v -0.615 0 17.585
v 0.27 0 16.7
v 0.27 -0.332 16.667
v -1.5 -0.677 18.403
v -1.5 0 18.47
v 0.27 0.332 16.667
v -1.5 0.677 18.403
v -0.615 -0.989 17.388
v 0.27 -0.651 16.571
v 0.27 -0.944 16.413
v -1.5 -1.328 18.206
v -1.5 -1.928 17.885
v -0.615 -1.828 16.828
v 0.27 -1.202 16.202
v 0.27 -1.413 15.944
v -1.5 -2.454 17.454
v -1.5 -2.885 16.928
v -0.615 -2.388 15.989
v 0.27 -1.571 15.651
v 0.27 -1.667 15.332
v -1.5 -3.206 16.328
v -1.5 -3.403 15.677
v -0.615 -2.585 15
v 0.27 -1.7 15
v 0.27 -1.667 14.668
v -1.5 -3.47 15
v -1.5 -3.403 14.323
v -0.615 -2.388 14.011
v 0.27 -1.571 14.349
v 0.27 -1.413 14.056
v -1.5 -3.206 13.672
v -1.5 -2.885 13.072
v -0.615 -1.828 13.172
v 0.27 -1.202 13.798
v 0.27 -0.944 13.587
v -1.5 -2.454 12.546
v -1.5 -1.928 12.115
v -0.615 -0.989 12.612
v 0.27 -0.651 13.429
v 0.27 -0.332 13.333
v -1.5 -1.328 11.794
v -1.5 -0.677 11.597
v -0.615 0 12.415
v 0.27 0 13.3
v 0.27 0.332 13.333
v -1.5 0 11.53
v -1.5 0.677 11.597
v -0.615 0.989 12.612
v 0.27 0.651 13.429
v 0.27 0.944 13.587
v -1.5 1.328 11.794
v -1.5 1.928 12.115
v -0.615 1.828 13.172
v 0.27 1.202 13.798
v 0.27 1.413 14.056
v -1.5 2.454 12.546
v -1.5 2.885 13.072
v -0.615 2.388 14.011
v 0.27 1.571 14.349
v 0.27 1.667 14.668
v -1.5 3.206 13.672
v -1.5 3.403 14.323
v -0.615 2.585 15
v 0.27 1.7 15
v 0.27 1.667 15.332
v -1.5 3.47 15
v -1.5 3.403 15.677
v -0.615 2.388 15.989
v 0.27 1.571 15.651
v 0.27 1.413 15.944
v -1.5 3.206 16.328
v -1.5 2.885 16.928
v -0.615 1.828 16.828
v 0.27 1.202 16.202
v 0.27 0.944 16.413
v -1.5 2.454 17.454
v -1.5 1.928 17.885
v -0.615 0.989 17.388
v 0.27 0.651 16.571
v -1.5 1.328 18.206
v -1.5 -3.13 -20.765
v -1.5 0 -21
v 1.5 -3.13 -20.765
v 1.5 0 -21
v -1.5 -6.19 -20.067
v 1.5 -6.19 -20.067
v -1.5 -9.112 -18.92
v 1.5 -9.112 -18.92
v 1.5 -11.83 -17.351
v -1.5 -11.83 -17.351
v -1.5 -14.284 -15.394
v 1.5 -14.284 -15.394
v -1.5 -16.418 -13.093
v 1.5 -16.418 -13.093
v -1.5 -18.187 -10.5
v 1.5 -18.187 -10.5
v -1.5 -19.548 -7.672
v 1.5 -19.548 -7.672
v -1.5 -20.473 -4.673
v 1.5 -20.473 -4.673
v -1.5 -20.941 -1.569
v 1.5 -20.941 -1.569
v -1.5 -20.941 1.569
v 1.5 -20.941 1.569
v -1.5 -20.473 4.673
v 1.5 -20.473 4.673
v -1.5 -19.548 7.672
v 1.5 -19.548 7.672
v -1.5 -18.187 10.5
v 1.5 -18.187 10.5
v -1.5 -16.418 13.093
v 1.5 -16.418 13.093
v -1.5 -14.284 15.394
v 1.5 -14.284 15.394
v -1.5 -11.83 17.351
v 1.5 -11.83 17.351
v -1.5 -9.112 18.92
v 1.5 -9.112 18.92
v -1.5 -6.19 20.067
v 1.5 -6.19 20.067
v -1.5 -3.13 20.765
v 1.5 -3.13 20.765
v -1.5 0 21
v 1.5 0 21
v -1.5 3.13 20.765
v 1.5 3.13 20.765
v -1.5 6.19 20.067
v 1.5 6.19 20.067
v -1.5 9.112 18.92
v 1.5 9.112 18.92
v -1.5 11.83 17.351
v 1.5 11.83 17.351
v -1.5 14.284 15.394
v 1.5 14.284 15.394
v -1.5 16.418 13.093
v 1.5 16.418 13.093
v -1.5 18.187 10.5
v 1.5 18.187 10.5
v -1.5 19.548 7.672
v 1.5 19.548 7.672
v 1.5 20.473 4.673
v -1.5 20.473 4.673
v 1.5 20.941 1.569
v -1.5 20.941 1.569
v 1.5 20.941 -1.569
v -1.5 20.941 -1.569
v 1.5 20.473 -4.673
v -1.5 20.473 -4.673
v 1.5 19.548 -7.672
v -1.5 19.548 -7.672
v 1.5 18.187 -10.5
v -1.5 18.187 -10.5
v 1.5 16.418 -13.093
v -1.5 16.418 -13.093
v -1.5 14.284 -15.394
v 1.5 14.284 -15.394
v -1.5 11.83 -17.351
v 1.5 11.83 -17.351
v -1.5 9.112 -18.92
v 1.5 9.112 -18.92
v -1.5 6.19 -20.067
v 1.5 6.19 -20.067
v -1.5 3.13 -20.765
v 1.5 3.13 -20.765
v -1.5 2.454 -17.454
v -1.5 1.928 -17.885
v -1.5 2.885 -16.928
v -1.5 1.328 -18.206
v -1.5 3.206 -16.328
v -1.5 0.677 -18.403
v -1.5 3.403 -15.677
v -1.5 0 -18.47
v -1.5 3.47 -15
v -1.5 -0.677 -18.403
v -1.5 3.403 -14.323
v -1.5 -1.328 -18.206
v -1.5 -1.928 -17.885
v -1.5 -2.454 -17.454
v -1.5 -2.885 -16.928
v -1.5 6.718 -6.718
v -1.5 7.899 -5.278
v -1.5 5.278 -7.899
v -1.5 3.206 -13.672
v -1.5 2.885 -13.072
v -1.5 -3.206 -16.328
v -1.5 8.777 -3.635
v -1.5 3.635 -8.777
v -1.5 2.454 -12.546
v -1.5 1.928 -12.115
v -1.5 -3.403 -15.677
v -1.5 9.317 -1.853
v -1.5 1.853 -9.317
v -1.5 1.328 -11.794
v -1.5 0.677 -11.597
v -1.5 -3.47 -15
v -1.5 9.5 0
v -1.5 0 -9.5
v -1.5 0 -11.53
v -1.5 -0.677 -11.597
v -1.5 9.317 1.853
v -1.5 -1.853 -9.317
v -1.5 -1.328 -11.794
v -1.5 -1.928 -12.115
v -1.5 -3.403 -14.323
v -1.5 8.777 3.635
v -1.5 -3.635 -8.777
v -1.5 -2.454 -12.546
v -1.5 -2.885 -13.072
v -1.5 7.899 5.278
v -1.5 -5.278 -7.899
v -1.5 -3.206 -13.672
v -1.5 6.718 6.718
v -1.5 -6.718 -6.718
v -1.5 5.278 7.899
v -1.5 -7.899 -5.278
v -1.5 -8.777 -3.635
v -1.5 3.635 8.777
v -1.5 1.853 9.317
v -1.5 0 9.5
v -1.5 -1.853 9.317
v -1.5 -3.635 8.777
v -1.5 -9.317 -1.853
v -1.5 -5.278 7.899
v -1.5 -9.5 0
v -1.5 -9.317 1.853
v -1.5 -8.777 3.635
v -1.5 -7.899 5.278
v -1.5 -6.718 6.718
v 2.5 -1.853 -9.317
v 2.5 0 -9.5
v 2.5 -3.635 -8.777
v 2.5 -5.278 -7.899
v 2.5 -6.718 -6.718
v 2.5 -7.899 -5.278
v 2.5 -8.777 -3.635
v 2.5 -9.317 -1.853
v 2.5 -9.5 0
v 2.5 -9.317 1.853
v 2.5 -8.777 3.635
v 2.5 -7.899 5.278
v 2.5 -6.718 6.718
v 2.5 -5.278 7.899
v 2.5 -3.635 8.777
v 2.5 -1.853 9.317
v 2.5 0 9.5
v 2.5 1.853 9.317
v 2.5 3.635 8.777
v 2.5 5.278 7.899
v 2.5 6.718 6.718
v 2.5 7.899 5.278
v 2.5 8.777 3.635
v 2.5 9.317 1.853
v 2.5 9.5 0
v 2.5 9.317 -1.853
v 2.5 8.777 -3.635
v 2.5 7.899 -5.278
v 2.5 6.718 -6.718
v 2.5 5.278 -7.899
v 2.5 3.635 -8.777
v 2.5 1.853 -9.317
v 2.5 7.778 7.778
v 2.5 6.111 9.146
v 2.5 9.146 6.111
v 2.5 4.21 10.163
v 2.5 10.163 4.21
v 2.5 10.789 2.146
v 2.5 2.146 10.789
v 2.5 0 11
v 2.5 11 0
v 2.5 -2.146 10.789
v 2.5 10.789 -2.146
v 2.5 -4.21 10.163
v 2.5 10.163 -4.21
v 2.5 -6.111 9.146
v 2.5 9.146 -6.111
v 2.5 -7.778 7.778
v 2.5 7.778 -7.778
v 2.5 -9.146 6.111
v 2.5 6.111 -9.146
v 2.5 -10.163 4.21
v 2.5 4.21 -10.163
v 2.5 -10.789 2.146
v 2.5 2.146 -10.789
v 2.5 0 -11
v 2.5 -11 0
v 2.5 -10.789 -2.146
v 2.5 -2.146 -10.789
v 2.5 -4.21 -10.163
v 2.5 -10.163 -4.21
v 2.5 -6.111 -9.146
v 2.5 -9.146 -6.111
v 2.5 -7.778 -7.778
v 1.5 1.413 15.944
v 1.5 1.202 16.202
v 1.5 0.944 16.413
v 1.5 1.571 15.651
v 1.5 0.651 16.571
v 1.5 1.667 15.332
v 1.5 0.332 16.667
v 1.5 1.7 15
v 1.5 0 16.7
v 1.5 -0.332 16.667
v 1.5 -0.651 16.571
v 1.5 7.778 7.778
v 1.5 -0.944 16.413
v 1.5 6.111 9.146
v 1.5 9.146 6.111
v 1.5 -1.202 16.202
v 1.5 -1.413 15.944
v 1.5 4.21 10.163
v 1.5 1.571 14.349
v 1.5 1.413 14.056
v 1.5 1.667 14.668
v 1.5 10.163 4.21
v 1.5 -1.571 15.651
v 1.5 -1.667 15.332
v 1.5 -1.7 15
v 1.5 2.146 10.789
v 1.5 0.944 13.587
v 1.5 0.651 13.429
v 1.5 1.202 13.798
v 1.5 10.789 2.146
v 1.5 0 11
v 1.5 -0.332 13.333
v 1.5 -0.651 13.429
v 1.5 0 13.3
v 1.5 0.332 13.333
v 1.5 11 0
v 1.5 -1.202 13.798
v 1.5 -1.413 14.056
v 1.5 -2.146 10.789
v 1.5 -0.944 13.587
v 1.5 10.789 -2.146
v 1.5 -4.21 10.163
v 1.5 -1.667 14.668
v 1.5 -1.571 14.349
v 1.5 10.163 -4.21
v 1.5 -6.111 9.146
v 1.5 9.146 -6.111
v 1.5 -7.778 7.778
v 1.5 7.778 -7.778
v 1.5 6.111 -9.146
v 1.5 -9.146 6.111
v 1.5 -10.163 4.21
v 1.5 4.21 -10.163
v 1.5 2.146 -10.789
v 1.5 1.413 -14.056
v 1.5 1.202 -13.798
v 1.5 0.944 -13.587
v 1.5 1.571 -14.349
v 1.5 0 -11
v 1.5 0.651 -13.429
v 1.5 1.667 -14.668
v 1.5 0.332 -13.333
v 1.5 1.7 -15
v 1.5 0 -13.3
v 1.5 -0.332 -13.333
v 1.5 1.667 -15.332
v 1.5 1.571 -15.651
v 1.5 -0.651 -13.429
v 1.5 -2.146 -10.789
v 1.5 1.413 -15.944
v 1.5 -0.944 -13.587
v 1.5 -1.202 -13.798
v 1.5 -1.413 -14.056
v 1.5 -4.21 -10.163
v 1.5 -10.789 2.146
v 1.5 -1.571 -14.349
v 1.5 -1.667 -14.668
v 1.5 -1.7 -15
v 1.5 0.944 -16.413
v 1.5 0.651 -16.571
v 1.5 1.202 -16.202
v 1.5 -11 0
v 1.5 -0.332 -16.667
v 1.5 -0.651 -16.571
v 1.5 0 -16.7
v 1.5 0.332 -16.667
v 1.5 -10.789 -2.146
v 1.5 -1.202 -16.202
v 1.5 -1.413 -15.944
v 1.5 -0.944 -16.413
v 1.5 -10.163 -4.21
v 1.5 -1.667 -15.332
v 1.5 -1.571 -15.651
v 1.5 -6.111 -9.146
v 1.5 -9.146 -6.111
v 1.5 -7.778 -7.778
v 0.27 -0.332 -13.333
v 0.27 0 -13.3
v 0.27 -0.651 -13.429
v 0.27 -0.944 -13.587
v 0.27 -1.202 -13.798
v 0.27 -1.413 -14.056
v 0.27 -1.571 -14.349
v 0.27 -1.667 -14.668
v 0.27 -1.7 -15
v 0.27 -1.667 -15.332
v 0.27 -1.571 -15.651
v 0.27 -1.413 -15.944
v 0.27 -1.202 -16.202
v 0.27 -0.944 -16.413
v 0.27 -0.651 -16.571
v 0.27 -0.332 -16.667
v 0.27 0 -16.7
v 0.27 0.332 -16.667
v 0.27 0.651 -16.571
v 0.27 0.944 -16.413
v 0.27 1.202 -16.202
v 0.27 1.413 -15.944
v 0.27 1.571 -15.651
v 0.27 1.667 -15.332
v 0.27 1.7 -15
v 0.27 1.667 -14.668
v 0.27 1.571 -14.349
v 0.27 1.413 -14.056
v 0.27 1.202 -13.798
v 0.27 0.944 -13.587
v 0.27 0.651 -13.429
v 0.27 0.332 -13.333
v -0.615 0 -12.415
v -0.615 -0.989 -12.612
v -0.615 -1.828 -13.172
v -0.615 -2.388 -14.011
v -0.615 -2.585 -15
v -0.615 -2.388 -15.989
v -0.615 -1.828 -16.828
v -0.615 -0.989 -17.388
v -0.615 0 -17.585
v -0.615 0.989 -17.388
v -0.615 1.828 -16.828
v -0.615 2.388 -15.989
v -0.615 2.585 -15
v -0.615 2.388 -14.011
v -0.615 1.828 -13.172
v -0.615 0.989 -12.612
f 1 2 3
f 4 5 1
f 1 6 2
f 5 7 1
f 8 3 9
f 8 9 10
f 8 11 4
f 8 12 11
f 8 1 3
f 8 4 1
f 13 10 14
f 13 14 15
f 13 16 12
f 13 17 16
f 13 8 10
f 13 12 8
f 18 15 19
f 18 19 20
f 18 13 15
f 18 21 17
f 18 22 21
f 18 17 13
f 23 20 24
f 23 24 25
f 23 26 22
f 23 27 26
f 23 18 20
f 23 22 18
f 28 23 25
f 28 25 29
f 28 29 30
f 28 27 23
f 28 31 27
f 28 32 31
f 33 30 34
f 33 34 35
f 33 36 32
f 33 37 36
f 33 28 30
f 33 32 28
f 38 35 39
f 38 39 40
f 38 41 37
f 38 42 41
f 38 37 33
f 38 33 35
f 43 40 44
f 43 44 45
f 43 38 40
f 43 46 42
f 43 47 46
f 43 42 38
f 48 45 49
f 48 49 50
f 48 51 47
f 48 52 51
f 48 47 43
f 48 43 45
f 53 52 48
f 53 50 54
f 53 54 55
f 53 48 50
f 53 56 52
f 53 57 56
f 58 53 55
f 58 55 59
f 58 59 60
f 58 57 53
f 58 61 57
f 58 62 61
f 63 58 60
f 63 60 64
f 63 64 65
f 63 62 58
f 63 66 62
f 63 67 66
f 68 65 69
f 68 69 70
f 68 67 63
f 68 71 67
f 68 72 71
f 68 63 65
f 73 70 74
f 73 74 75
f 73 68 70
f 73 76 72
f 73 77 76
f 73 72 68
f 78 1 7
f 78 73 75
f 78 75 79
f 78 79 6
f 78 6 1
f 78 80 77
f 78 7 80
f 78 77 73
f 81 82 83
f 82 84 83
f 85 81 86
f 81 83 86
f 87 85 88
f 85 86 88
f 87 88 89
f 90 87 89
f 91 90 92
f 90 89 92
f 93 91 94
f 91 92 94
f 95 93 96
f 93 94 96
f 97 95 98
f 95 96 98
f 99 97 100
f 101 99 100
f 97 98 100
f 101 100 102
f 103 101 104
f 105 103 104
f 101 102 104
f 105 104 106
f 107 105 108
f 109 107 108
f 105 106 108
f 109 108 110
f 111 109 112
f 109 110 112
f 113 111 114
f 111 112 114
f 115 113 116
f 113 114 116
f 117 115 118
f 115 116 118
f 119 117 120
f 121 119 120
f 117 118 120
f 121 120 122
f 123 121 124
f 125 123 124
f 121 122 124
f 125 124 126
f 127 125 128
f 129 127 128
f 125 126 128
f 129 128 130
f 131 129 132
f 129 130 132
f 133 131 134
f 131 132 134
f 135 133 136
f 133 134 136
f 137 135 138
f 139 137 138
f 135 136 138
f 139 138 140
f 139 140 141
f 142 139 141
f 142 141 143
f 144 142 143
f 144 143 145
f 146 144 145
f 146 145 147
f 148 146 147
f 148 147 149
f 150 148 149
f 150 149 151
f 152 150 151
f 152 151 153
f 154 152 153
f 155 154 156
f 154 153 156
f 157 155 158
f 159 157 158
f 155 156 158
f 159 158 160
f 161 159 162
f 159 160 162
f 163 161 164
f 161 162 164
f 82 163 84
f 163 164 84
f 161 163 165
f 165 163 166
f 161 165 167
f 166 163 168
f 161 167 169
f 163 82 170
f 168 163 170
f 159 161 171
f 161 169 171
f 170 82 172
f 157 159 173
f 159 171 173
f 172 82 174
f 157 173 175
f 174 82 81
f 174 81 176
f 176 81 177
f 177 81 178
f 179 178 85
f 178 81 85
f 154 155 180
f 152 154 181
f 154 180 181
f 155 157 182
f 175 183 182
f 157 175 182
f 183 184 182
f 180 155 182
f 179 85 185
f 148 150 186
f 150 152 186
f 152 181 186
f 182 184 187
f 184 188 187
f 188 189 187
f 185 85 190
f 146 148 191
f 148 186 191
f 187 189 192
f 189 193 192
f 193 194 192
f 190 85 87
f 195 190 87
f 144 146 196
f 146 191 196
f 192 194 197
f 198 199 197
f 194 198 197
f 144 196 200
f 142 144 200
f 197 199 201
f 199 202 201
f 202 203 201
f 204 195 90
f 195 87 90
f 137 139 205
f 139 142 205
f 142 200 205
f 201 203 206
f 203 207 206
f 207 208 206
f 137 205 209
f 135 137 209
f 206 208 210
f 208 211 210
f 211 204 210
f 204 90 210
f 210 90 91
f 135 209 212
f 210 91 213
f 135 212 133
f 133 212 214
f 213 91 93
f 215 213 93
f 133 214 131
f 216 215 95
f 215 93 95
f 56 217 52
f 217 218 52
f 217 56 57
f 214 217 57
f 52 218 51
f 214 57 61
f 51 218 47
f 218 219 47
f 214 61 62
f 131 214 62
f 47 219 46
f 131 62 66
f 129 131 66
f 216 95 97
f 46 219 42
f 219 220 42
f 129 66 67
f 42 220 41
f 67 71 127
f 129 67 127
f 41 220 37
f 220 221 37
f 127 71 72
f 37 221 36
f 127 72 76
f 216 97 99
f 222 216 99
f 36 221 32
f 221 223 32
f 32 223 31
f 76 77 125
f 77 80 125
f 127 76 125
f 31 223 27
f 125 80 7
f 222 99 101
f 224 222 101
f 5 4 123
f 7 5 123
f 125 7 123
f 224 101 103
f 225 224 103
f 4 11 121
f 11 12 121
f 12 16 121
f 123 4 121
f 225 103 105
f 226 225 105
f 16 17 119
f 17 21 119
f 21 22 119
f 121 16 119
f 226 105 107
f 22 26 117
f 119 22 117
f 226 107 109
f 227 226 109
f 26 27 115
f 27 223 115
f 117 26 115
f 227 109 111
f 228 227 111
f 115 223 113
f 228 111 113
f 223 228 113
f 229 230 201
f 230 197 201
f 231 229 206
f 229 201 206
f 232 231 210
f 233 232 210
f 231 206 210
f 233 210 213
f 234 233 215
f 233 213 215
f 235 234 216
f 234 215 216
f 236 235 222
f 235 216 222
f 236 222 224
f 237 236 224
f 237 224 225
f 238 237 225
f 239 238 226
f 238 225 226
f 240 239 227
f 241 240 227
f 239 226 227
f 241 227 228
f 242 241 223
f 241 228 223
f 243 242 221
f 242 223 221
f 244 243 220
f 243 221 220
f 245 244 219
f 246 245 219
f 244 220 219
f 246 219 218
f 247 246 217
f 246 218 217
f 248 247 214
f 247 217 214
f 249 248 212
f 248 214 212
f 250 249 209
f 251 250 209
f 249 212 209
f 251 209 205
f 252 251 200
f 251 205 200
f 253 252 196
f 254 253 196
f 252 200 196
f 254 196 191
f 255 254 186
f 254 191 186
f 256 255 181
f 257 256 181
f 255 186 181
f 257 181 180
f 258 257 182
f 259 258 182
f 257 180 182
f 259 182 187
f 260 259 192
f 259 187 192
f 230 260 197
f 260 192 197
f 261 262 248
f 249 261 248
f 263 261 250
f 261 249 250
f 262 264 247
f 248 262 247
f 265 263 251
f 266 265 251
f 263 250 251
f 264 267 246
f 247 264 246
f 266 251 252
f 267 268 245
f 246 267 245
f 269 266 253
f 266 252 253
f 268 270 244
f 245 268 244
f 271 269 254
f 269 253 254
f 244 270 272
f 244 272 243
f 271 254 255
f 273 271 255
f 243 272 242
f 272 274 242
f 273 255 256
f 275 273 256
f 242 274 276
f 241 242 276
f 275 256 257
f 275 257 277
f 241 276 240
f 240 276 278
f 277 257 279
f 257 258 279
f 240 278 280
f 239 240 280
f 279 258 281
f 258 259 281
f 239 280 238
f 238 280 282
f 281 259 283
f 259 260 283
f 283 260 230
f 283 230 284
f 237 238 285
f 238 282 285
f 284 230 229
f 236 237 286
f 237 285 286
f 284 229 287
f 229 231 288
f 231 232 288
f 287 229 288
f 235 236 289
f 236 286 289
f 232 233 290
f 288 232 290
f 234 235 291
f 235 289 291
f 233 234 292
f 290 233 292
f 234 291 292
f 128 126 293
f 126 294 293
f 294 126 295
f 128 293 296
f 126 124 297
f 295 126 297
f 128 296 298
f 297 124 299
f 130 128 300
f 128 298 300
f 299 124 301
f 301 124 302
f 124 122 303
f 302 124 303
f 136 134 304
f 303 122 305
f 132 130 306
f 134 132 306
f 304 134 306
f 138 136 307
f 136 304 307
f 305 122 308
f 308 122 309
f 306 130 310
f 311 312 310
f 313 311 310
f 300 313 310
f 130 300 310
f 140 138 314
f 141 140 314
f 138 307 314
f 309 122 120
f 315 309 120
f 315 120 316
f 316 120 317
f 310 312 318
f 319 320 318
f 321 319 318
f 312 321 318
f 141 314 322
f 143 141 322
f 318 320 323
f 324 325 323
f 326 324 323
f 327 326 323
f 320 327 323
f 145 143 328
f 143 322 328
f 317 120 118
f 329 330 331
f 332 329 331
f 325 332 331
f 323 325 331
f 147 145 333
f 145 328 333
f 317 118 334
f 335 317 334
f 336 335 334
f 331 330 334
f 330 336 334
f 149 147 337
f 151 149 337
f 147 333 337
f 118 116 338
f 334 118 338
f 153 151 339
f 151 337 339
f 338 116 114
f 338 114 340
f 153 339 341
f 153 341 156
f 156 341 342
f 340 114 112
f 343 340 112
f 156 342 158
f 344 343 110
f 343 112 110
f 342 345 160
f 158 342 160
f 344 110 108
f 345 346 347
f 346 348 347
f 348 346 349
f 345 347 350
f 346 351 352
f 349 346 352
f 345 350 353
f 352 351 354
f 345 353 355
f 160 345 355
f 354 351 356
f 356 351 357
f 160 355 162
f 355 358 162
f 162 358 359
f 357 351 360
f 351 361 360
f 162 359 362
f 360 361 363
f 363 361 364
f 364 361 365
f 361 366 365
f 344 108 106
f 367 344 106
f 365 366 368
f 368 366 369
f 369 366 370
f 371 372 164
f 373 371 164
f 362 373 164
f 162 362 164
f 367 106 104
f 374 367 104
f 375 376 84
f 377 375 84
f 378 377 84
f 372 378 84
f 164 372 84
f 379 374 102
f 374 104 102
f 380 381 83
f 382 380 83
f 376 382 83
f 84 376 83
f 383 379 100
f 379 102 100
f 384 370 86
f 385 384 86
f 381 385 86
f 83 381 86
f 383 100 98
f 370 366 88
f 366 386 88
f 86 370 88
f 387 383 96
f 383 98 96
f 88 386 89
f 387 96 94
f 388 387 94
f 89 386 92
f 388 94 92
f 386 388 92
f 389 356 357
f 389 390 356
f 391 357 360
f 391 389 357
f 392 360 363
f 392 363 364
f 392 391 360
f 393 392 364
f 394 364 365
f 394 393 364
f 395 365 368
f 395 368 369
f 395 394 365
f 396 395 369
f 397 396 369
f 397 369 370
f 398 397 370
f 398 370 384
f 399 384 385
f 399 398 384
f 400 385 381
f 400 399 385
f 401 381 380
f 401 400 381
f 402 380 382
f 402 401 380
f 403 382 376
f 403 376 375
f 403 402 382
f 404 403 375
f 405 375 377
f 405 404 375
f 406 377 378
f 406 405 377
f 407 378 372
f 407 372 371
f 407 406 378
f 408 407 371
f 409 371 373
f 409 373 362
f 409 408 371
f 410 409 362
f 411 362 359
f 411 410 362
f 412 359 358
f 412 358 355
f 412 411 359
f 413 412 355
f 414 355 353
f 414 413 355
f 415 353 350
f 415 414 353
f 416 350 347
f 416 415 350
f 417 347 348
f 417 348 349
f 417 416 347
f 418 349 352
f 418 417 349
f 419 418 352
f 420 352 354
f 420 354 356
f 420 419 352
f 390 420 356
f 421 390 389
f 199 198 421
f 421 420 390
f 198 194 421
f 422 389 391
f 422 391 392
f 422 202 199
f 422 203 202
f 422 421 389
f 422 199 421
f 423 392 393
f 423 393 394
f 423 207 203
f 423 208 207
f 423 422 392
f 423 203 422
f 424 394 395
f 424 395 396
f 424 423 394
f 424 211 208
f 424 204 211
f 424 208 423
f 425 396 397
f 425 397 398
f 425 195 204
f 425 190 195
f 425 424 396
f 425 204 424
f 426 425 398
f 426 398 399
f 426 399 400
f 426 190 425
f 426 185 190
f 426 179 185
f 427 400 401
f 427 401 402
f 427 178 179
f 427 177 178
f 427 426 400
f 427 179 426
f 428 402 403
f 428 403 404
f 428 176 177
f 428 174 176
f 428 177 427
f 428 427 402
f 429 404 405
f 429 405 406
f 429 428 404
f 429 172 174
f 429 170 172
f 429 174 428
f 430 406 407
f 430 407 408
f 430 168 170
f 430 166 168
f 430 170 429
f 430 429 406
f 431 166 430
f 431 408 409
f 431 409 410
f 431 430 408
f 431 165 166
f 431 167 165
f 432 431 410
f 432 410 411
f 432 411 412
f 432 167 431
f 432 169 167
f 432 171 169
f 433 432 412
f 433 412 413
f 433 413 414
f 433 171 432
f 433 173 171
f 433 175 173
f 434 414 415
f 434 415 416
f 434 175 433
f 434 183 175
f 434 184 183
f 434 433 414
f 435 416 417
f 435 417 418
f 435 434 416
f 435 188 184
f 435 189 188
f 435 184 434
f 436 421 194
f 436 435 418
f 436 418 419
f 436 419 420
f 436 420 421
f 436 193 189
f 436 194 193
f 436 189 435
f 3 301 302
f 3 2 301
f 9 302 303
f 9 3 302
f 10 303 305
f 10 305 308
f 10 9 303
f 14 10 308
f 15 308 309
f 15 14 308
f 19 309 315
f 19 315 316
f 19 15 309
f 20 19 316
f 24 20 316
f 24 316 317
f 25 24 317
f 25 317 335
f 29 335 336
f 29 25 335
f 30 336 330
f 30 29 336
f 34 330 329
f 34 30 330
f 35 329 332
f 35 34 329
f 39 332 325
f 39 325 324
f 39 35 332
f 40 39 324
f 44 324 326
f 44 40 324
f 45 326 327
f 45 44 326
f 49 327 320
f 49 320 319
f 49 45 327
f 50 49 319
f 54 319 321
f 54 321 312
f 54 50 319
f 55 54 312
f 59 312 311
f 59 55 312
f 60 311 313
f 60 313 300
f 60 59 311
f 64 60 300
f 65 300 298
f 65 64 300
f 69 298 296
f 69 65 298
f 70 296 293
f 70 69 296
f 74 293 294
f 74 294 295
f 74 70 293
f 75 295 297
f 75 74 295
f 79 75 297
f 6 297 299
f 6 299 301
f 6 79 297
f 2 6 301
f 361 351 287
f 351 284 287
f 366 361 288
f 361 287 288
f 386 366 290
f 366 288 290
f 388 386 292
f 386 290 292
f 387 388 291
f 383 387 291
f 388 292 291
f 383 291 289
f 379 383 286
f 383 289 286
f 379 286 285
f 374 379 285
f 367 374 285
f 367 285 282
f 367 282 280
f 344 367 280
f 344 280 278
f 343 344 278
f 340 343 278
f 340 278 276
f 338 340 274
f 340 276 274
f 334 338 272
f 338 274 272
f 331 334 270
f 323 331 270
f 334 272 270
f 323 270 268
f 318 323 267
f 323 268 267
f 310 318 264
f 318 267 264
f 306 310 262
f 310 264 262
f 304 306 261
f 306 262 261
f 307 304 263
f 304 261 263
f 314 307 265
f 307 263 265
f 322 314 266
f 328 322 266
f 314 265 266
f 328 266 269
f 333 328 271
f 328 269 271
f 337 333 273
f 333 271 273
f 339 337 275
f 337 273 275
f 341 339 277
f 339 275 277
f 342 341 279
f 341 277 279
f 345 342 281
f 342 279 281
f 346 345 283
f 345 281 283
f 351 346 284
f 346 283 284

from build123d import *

# Parameters (mm, degrees)
CSK_FOR_M3_HEX_SOCKET_COUNTERSUNK_HE_2_COUNT = 2
CSK_FOR_M3_HEX_SOCKET_COUNTERSUNK_HE_2_PITCH = 30


with BuildPart() as part:
    # Sketch1 → Revolve1 (revolve)
    with BuildSketch(Plane(origin=(0, 0, 0), x_dir=(1, 0, 0), z_dir=(0, 1, 0))):
        Polygon((-1.5, 21), (1.5, 21), (1.5, 11), (2.5, 11), (2.5, 9.5), (-1.5, 9.5), align=None)
    revolve(axis=Axis((88.99, 0, 0), (-1, 0, 0)))

    # Sketch3 → CSK for M3 Hex Socket Countersunk Head Screw1 (revolve, cut)
    with BuildSketch(Plane(origin=(-1.5, 0, 15), x_dir=(0, 0, 1), z_dir=(0, 1, 0))):
        Polygon((0, 0), (0, 3), (1.7, 3), (1.7, 1.77), (3.47, 0), align=None)
    csk_for_m3_hex_socket_countersunk_head_s = revolve(axis=Axis((-7.85, 0, 15), (1, 0, 0)), mode=Mode.SUBTRACT)

    # CSK for M3 Hex Socket Countersunk He 2: CSK for M3 Hex Socket Countersunk Head Screw1 ×2
    with Locations(*[(0, 0, -i * CSK_FOR_M3_HEX_SOCKET_COUNTERSUNK_HE_2_PITCH) for i in range(1, CSK_FOR_M3_HEX_SOCKET_COUNTERSUNK_HE_2_COUNT)]):
        add(csk_for_m3_hex_socket_countersunk_head_s, mode=Mode.SUBTRACT)


solid = part.part
